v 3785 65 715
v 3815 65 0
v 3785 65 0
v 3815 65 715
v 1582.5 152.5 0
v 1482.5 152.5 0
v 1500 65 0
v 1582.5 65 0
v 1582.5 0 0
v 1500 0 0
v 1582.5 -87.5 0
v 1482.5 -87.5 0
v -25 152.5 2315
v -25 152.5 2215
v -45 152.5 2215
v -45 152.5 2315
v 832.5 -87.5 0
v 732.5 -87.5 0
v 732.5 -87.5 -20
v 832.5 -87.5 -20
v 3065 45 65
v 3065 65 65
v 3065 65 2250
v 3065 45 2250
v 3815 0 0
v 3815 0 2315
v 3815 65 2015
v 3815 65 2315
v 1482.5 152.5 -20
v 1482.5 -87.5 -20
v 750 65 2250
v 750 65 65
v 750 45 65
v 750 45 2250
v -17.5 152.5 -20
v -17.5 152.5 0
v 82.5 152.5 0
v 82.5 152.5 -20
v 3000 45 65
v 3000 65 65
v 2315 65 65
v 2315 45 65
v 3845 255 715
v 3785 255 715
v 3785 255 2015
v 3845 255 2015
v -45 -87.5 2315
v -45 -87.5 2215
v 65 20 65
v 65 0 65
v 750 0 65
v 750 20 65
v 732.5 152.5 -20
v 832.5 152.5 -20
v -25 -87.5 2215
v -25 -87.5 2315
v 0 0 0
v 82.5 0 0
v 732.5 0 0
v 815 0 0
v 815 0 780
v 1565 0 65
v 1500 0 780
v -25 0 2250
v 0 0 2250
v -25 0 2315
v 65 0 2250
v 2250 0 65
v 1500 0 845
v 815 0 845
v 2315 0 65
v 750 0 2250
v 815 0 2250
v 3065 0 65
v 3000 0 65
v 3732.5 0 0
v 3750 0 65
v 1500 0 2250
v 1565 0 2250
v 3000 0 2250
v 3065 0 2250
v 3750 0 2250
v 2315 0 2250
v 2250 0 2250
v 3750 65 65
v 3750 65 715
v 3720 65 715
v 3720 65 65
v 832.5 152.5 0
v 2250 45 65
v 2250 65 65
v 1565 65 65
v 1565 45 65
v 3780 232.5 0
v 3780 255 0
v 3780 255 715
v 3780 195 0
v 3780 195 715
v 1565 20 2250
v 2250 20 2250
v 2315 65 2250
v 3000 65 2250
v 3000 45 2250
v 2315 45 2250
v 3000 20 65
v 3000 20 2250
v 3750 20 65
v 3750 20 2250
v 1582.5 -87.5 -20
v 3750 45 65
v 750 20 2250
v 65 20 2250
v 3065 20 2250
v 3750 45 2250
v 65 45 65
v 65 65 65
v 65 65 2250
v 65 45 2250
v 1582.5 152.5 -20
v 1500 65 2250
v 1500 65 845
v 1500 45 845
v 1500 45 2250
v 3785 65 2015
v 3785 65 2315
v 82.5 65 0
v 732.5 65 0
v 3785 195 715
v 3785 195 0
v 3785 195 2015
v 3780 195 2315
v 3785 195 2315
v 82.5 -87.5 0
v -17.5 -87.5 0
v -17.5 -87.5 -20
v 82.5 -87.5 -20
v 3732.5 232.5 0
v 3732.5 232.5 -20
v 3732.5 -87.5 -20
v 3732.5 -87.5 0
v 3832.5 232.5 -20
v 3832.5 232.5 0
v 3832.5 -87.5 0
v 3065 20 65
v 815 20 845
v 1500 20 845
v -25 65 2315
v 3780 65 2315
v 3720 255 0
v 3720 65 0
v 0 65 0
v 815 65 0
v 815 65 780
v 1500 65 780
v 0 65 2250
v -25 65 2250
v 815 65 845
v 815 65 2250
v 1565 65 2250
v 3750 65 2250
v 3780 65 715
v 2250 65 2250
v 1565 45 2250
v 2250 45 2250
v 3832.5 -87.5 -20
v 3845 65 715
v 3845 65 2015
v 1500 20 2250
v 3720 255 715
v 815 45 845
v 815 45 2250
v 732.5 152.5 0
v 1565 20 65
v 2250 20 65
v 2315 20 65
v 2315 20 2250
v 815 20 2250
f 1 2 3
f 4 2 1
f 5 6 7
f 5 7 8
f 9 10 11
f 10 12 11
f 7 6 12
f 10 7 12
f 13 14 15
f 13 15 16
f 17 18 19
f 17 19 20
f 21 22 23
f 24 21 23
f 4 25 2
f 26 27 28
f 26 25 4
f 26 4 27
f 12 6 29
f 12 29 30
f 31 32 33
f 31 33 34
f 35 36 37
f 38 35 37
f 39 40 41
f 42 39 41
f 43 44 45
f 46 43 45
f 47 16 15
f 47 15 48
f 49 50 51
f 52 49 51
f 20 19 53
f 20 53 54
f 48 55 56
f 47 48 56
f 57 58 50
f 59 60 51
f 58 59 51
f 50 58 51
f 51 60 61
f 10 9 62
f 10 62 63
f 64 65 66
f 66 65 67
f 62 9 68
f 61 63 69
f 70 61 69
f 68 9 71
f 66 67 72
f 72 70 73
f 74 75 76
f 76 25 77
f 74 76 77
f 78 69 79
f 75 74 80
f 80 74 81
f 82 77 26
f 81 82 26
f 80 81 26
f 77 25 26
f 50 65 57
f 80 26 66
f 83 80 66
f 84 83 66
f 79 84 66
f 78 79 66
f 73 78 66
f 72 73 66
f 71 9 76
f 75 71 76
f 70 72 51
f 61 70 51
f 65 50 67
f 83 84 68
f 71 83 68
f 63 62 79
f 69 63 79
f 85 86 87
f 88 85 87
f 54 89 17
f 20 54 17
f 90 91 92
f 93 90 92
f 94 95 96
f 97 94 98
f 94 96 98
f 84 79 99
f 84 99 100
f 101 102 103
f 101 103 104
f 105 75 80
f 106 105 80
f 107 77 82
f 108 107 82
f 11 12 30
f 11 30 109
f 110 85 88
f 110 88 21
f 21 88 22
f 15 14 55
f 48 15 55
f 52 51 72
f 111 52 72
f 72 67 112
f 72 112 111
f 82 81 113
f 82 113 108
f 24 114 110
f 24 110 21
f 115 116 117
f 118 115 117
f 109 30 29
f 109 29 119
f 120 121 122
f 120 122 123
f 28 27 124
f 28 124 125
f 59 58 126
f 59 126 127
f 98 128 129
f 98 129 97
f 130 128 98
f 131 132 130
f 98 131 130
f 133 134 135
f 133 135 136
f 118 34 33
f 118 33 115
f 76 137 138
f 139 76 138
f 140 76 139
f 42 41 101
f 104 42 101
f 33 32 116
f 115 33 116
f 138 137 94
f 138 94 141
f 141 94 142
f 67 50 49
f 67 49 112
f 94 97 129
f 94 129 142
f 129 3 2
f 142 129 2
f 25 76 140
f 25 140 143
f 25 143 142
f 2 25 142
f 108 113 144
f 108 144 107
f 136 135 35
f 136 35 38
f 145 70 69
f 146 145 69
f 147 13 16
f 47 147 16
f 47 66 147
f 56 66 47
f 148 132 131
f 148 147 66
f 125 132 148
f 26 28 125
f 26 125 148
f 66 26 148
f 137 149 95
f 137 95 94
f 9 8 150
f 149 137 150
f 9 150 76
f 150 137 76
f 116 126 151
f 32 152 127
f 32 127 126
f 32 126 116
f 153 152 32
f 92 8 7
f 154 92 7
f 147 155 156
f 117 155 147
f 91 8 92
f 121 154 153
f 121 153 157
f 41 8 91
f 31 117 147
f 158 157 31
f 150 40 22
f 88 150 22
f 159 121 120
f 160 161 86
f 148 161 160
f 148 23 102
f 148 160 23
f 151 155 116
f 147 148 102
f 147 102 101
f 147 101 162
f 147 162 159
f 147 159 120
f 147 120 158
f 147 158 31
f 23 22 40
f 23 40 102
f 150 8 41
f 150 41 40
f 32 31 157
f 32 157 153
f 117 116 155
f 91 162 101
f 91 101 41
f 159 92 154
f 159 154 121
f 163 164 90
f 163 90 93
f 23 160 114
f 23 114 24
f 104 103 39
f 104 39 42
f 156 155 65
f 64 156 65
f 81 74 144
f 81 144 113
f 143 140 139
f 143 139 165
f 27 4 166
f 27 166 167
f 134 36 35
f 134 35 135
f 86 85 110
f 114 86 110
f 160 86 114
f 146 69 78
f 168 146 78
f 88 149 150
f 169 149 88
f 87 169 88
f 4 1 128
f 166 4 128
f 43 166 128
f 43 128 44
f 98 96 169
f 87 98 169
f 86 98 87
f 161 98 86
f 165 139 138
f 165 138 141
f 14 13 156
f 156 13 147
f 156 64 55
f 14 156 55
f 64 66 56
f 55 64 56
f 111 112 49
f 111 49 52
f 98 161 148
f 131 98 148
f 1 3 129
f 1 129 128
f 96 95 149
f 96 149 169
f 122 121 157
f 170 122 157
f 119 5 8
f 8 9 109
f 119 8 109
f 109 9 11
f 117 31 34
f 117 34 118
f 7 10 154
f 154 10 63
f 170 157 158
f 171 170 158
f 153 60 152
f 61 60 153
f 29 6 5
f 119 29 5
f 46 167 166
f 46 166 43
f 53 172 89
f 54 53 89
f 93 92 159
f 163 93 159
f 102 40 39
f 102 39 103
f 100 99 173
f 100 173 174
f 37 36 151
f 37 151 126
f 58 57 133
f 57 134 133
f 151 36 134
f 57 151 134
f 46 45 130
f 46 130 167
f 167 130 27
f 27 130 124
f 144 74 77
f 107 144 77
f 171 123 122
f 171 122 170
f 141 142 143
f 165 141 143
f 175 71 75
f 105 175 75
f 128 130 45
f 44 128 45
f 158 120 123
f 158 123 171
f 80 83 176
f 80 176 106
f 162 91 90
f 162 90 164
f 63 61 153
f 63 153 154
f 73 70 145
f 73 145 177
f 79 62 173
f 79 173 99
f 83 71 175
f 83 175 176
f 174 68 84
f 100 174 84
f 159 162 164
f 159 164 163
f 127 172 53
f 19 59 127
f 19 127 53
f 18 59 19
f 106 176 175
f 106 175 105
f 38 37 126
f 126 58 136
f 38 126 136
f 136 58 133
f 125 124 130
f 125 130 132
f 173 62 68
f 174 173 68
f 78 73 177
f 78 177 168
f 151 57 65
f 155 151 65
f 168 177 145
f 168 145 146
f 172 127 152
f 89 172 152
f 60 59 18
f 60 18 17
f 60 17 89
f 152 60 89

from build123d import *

# Parameters (mm, degrees)
F0_W      = 3815
F0_H      = 2315
F1_DEPTH  = 65
F2_W      = 685
F2_H      = 2185
F2_H_2    = 1405
F3_DEPTH  = 20
F4_W      = 100
F4_H      = 240
F4_H_2    = 320
F5_DEPTH  = 20
F6_W      = 65
F6_H      = 65
F7_DEPTH  = 25
F8_W      = 240
F8_H      = 100
F9_DEPTH  = 20
F10_W     = 5
F10_H     = 2315
F11_DEPTH = 130
F12_W     = 130
F12_H     = 1300
F12_W_2   = 60
F13_DEPTH = 60
F14_W     = 190
F14_H     = 715
F15_DEPTH = 60
F16_W     = 685
F16_H     = 780
F17_DEPTH = 255.001
F18_W     = 685
F18_H     = 2185
F18_H_2   = 1405
F19_DEPTH = 20


with BuildPart() as f1:
    # F0 (on Front) → F1 (new body)
    with BuildSketch(Plane.XZ):
        with Locations((1907.5, 1157.5)):
            Rectangle(F0_W, F0_H)
    extrude(amount=-F1_DEPTH)

    # F2 (on face) → F3 (cut)
    with BuildSketch(Plane.XZ):
        with Locations((407.5, 1157.5)):
            Rectangle(F2_W, F2_H)
        with Locations((1157.5, 1547.5)):
            Rectangle(F2_W, F2_H_2)
        with Locations((1907.5, 1157.5)):
            Rectangle(F2_W, F2_H)
        with Locations((3407.5, 1157.5)):
            Rectangle(F2_W, F2_H)
        with Locations((2657.5, 1157.5)):
            Rectangle(F2_W, F2_H)
    extrude(amount=-F3_DEPTH, mode=Mode.SUBTRACT)

    # F4 (on face) → F5 (join)
    with BuildSketch(Plane(origin=(0, 0, 0), x_dir=(1, 0, 0), z_dir=(0, 0, -1))):
        with Locations((32.5, -32.5)):
            Rectangle(F4_W, F4_H)
        with Locations((782.5, -32.5)):
            Rectangle(F4_W, F4_H)
        with Locations((1532.5, -32.5)):
            Rectangle(F4_W, F4_H)
        with Locations((3782.5, -72.5)):
            Rectangle(F4_W, F4_H_2)
    extrude(amount=F5_DEPTH)

    # F6 (on face) → F7 (join)
    with BuildSketch(Plane(origin=(0, 0, 0), x_dir=(0, -1, 0), z_dir=(-1, 0, 0))):
        with Locations((-32.5, 2282.5)):
            Rectangle(F6_W, F6_H)
    extrude(amount=F7_DEPTH)

    # F8 (on face) → F9 (join)
    with BuildSketch(Plane(origin=(-25, 0, 0), x_dir=(0, -1, 0), z_dir=(-1, 0, 0))):
        with Locations((-32.5, 2265)):
            Rectangle(F8_W, F8_H)
    extrude(amount=F9_DEPTH)

    # F10 (on face) → F11 (join)
    with BuildSketch(Plane(origin=(0, 65, 0), x_dir=(-1, 0, 0), z_dir=(0, 1, 0))):
        with Locations((-3782.5, 1157.5)):
            Rectangle(F10_W, F10_H)
    extrude(amount=F11_DEPTH)

    # F12 (on face) → F13 (join)
    with BuildSketch(Plane.YZ.offset(3785)):
        with Locations((130, 1365)):
            Rectangle(F12_W, F12_H)
        with Locations((225, 1365)):
            Rectangle(F12_W_2, F12_H)
    extrude(amount=F13_DEPTH)

    # F14 (on face) → F15 (join)
    with BuildSketch(Plane(origin=(3780, 0, 0), x_dir=(0, -1, 0), z_dir=(-1, 0, 0))):
        with Locations((-160, 357.5)):
            Rectangle(F14_W, F14_H)
    extrude(amount=F15_DEPTH)

    # F16 (on face) → F17 (cut, through all)
    with BuildSketch(Plane.XZ):
        with Locations((1157.5, 390)):
            Rectangle(F16_W, F16_H)
    extrude(amount=-F17_DEPTH, mode=Mode.SUBTRACT)

    # F18 (on face) → F19 (cut)
    with BuildSketch(Plane(origin=(0, 65, 0), x_dir=(-1, 0, 0), z_dir=(0, 1, 0))):
        with Locations((-3407.5, 1157.5)):
            Rectangle(F18_W, F18_H)
        with Locations((-2657.5, 1157.5)):
            Rectangle(F18_W, F18_H)
        with Locations((-1907.5, 1157.5)):
            Rectangle(F18_W, F18_H)
        with Locations((-407.5, 1157.5)):
            Rectangle(F18_W, F18_H)
        with Locations((-1157.5, 1547.5)):
            Rectangle(F18_W, F18_H_2)
    extrude(amount=-F19_DEPTH, mode=Mode.SUBTRACT)


solid = f1.part
